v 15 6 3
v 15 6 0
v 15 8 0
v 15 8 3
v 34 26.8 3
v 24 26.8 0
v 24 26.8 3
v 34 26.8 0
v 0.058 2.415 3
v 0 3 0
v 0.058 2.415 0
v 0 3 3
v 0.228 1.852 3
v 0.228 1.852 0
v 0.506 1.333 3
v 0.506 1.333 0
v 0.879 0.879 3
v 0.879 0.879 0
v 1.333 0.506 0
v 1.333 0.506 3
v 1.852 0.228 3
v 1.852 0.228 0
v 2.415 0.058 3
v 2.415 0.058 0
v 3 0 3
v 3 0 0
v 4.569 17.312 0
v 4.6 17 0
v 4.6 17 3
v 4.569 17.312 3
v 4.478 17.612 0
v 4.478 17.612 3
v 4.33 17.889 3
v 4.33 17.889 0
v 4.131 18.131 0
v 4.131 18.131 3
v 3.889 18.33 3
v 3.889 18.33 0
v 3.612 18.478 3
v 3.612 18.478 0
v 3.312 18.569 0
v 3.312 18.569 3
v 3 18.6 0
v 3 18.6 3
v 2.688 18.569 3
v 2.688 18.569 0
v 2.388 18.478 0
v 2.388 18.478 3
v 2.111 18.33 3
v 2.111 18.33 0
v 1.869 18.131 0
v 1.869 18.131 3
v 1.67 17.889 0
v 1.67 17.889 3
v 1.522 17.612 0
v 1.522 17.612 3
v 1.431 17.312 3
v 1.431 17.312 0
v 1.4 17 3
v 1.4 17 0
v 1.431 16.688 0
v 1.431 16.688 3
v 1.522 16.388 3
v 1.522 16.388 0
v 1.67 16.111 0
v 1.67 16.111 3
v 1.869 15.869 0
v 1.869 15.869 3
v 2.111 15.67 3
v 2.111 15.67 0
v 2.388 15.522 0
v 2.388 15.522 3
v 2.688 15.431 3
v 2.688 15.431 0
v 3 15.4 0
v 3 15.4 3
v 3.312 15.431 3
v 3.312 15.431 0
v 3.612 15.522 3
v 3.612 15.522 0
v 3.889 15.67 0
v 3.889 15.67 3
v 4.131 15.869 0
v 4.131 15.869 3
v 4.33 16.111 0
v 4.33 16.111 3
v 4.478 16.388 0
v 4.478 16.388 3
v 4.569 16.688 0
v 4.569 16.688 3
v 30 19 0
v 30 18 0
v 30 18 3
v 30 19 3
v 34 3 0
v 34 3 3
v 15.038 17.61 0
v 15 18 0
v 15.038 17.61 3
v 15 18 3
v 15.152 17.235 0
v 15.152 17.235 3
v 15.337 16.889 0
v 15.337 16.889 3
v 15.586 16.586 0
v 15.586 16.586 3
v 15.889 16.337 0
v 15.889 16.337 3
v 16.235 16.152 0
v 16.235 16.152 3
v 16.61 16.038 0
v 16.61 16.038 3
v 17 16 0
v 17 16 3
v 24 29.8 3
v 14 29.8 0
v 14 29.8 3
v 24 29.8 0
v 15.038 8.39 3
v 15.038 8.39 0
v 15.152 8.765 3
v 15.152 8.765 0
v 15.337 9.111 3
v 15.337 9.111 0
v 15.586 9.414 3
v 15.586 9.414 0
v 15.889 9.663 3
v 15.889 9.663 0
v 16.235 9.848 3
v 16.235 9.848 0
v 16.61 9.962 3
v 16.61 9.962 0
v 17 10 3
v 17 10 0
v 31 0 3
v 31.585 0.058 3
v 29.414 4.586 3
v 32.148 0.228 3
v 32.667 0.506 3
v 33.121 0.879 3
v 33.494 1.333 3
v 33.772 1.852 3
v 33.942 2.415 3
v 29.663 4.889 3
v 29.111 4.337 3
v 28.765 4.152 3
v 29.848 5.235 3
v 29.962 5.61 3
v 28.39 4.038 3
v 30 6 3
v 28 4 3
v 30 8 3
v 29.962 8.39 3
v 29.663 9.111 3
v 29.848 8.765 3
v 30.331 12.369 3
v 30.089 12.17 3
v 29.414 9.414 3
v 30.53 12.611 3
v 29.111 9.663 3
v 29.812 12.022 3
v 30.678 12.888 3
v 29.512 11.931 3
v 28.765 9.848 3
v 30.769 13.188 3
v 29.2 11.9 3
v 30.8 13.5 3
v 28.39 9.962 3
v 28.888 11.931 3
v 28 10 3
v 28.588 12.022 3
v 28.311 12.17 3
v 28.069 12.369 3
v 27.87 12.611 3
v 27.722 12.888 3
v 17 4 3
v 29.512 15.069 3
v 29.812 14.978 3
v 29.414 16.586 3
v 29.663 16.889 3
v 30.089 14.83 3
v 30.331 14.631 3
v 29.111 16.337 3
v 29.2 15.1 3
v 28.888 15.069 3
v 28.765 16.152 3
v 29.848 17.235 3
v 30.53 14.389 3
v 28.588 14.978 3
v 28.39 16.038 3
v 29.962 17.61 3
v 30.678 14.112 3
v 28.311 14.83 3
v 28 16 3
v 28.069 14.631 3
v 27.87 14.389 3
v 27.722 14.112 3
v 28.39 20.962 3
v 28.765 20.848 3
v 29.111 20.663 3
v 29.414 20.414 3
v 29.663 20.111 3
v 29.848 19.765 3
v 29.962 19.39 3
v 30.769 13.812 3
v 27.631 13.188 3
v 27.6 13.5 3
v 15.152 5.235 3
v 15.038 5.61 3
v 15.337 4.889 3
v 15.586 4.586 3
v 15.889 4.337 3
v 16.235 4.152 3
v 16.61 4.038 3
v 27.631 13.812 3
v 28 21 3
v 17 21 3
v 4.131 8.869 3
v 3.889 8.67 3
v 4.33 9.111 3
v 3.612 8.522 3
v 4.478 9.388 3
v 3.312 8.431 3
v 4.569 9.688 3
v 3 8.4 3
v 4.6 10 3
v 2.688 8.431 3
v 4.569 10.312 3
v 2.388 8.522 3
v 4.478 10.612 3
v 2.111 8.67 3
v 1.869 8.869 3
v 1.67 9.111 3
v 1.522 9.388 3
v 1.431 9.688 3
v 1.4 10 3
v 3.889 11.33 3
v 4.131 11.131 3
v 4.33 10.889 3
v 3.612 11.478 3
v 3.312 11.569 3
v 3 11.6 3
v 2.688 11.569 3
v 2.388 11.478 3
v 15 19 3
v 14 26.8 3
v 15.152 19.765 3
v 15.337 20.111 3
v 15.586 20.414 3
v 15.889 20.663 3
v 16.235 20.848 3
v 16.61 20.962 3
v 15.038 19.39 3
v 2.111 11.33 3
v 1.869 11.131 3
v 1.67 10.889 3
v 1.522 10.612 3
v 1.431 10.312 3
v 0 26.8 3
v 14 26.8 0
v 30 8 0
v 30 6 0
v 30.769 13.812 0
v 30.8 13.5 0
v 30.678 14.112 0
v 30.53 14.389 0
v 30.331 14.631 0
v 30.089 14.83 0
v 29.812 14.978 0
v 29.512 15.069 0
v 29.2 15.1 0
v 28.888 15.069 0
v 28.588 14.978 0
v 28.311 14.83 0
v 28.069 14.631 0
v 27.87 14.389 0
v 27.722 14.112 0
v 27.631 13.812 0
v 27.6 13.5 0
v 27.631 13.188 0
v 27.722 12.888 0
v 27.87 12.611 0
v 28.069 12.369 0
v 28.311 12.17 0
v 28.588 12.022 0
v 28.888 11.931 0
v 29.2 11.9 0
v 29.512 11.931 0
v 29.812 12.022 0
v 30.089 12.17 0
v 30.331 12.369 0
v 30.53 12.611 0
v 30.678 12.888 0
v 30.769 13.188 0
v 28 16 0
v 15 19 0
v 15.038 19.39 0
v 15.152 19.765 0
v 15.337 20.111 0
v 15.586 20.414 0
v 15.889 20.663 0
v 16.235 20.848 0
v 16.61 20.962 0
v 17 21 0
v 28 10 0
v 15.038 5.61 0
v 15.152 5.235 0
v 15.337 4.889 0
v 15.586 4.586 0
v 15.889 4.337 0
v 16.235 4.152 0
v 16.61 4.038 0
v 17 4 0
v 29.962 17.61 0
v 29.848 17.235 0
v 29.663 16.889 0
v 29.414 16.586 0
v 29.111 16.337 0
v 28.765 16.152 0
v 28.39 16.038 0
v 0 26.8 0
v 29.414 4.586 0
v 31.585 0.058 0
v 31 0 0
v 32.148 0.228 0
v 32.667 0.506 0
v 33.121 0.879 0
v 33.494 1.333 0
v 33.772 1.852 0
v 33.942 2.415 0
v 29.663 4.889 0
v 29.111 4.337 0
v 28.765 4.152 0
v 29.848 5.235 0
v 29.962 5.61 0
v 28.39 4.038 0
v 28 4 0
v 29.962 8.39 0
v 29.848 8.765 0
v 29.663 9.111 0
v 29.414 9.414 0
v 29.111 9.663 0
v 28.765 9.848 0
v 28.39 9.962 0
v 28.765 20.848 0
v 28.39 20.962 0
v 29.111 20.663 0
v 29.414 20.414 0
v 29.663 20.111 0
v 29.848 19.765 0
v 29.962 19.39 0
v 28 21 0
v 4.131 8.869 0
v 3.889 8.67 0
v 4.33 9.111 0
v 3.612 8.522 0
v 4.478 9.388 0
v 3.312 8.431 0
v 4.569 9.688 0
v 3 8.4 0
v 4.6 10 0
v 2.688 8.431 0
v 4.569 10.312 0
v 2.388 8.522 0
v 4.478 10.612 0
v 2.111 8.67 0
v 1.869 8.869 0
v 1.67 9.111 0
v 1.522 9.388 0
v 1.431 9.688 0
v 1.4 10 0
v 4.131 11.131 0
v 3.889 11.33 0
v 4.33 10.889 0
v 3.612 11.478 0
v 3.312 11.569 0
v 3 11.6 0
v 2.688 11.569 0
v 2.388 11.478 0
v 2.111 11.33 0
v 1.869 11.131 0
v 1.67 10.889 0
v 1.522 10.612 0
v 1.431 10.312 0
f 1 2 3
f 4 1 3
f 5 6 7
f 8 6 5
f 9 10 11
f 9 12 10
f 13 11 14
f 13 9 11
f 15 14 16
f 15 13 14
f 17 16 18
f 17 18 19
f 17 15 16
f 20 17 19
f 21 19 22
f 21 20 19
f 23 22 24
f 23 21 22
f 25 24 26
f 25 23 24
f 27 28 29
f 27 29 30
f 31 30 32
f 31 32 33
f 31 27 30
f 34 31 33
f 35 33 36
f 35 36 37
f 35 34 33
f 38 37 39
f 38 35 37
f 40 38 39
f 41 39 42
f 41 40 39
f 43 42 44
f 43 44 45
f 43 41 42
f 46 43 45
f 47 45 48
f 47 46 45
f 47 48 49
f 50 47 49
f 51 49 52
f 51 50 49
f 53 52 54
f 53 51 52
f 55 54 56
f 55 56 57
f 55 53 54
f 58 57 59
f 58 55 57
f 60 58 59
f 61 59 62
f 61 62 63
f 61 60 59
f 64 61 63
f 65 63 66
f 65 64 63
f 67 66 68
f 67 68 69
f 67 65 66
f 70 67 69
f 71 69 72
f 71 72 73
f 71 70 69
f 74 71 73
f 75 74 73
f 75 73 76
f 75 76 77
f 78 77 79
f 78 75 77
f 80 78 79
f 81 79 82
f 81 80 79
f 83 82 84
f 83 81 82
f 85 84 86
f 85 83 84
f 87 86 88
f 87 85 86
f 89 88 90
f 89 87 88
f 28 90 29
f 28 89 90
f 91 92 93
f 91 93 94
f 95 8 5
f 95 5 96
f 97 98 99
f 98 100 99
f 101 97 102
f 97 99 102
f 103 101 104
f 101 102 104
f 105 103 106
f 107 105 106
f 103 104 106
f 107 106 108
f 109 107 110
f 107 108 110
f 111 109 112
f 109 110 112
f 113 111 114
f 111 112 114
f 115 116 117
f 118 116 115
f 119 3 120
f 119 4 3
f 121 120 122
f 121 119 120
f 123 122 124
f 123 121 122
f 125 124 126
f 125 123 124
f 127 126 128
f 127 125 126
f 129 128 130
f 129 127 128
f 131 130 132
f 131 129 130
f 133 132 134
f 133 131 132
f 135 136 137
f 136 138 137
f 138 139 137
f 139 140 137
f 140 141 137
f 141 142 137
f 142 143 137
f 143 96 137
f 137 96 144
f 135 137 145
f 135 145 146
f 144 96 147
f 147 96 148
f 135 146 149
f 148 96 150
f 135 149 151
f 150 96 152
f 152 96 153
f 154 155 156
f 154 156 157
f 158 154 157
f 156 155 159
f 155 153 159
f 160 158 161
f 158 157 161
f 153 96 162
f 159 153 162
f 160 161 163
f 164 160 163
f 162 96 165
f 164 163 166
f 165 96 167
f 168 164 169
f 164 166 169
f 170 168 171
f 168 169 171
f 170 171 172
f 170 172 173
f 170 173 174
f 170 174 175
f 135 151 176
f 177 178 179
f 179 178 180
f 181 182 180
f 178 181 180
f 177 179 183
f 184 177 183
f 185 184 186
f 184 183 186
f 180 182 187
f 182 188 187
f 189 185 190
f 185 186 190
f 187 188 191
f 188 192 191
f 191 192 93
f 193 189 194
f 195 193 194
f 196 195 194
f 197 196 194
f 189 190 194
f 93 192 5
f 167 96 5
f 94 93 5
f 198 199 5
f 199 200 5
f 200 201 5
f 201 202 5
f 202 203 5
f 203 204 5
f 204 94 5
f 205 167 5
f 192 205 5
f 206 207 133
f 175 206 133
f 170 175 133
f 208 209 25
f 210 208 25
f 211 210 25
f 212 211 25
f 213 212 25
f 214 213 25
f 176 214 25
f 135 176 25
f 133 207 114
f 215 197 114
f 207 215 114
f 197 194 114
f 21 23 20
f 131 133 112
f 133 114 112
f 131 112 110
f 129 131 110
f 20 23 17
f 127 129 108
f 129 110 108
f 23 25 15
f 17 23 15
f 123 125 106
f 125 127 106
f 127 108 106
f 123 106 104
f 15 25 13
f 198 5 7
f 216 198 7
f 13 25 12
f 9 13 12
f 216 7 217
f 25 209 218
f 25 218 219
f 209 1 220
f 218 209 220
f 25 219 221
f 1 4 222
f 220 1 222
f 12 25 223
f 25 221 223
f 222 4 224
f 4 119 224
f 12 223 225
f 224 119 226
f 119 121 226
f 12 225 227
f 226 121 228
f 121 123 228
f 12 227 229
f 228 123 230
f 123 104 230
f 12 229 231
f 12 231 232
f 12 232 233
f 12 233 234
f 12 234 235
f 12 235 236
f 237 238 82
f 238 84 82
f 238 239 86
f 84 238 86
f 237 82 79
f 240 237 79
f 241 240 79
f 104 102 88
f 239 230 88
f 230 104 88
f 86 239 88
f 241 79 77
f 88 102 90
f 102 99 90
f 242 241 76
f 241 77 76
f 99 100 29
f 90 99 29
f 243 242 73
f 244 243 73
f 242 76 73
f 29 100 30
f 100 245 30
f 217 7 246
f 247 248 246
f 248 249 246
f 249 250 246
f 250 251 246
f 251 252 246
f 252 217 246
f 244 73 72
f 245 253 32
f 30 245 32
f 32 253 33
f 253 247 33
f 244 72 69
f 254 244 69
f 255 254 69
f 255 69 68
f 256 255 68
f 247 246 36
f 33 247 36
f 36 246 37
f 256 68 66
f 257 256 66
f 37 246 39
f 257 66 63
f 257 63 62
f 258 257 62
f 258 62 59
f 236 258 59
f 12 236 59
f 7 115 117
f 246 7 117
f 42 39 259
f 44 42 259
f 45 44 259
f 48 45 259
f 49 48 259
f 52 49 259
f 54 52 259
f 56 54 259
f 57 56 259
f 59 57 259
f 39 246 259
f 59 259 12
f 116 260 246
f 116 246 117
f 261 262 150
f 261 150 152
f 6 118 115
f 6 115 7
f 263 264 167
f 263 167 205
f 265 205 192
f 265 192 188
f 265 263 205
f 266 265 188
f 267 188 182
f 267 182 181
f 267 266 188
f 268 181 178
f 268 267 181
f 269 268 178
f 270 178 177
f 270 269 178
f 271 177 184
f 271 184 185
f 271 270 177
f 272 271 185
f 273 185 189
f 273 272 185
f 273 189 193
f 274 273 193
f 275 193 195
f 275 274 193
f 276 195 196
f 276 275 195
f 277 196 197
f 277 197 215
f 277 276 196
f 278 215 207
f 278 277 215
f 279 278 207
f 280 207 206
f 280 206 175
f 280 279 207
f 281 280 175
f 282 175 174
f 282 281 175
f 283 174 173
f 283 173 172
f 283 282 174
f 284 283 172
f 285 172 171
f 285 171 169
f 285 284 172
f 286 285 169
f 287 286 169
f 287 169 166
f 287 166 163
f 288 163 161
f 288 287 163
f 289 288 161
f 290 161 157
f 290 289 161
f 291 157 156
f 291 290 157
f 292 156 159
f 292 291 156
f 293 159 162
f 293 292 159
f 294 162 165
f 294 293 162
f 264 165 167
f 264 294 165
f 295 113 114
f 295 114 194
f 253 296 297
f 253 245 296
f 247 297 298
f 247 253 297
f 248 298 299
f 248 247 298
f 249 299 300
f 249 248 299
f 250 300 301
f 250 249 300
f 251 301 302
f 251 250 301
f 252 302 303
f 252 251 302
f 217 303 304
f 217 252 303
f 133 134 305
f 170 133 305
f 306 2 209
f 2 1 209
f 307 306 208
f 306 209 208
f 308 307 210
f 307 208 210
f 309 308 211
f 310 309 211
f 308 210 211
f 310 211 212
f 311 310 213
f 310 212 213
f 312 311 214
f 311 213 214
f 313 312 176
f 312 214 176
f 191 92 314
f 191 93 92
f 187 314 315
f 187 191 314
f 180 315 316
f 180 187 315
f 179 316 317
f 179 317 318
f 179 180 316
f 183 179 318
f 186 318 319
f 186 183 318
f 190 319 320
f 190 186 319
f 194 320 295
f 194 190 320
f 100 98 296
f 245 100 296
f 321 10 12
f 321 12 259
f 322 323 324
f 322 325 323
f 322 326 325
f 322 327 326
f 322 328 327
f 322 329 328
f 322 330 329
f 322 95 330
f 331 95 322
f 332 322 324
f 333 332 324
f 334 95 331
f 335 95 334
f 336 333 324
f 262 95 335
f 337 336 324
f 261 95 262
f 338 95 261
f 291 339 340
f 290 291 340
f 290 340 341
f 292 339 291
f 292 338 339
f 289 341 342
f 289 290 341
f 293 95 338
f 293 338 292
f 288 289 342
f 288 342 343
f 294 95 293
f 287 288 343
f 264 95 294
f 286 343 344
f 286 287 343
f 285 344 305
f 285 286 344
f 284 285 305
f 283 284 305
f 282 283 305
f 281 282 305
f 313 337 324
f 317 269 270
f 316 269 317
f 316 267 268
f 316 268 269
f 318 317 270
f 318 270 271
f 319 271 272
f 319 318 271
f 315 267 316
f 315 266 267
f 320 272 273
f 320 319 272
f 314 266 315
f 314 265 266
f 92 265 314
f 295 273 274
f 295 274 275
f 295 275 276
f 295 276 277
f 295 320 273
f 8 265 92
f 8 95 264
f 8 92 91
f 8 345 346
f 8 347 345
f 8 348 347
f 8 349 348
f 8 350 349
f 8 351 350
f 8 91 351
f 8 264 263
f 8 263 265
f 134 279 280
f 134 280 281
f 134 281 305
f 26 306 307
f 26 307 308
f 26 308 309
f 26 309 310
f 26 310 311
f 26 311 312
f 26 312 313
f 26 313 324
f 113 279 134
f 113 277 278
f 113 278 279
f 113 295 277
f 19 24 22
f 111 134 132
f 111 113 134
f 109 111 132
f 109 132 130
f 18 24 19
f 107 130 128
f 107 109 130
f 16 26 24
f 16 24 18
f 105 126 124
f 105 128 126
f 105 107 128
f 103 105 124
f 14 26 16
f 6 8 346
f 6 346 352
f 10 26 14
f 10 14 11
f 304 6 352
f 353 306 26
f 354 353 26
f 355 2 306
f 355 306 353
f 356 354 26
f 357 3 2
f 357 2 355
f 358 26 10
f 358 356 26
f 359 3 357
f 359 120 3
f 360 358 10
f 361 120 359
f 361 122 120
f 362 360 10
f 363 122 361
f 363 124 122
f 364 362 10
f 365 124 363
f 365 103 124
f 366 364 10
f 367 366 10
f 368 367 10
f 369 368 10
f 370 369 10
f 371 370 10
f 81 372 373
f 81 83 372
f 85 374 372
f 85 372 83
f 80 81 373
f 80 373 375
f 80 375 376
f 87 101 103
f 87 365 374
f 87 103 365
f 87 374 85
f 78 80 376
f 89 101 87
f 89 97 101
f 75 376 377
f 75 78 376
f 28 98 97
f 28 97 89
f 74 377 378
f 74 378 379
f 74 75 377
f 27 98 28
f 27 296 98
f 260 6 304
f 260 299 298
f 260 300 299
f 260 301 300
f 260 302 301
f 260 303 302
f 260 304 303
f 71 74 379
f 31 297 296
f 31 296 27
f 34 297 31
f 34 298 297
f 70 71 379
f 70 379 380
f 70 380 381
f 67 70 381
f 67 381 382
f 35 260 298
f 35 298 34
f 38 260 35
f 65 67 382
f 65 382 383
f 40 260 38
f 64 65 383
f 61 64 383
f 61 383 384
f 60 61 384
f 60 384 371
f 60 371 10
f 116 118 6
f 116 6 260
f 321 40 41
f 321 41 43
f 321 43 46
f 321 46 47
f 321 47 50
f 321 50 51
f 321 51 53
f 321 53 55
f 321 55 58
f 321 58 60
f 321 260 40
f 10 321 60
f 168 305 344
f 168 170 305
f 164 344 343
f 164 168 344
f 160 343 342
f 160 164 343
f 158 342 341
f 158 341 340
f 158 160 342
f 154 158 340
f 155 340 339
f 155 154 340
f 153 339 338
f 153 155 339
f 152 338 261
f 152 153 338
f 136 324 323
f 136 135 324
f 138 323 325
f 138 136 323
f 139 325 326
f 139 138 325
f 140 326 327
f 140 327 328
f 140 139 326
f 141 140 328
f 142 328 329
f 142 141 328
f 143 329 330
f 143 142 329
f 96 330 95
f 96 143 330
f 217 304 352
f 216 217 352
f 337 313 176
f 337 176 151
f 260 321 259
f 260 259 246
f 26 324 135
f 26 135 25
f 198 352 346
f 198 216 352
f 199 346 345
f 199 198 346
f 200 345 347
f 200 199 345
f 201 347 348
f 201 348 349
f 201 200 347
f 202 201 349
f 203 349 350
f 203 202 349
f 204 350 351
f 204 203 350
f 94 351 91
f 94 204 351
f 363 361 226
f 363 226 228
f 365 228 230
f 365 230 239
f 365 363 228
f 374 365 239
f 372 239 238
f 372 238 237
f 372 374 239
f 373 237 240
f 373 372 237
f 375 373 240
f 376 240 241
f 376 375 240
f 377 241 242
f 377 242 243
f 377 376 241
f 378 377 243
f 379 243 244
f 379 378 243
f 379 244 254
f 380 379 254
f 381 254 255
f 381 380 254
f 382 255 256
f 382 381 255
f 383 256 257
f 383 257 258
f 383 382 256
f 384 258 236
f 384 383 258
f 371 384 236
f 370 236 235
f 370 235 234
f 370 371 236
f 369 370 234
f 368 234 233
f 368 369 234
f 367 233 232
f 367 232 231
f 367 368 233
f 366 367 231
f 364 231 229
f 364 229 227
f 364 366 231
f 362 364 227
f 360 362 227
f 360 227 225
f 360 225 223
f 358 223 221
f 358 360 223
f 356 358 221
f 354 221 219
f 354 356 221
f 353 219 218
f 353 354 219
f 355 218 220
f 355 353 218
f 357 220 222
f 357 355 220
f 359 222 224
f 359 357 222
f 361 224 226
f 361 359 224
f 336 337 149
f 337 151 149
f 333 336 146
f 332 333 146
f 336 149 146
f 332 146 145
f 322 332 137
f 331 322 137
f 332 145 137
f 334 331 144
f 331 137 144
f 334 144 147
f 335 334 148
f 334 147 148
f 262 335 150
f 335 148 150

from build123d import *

# Parameters (mm, degrees)
SKETCH_1_R      = 1.6
SKETCH_1_W      = 15
SKETCH_1_H      = 6
SKETCH_1_H_2    = 5
EXTRUDE_1_DEPTH = 3
FILLET_1_R      = 2
FILLET_2_R      = 3


with BuildPart() as part:
    # 草图1 → 凸台-拉伸1 (new body)
    with BuildSketch(Plane.XY):
        Polygon((0, 0), (0, 26.8), (14, 26.8), (14, 29.8), (24, 29.8), (24, 26.8), (34, 26.8), (34, 0), align=None)
        with Locations((3, 17)):
            Circle(SKETCH_1_R, mode=Mode.SUBTRACT)
        with Locations((3, 10)):
            Circle(SKETCH_1_R, mode=Mode.SUBTRACT)
        with Locations((29.2, 13.5)):
            Circle(SKETCH_1_R, mode=Mode.SUBTRACT)
        with Locations((22.5, 7)):
            Rectangle(SKETCH_1_W, SKETCH_1_H, mode=Mode.SUBTRACT)
        with Locations((22.5, 18.5)):
            Rectangle(SKETCH_1_W, SKETCH_1_H_2, mode=Mode.SUBTRACT)
    extrude(amount=EXTRUDE_1_DEPTH)

    # 圆角1
    fillet_1_edges = [part.edges().sort_by_distance(p)[0] for p in [
        (15, 10, 1.5),
        (15, 4, 1.5),
        (30, 4, 1.5),
        (30, 10, 1.5),
        (15, 21, 1.5),
        (15, 16, 1.5),
        (30, 16, 1.5),
        (30, 21, 1.5),
    ]]
    fillet(fillet_1_edges, radius=FILLET_1_R)

    # 圆角2
    fillet_2_edges = [part.edges().sort_by_distance(p)[0] for p in [
        (0, 0, 1.5),
        (34, 0, 1.5),
    ]]
    fillet(fillet_2_edges, radius=FILLET_2_R)


solid = part.part
